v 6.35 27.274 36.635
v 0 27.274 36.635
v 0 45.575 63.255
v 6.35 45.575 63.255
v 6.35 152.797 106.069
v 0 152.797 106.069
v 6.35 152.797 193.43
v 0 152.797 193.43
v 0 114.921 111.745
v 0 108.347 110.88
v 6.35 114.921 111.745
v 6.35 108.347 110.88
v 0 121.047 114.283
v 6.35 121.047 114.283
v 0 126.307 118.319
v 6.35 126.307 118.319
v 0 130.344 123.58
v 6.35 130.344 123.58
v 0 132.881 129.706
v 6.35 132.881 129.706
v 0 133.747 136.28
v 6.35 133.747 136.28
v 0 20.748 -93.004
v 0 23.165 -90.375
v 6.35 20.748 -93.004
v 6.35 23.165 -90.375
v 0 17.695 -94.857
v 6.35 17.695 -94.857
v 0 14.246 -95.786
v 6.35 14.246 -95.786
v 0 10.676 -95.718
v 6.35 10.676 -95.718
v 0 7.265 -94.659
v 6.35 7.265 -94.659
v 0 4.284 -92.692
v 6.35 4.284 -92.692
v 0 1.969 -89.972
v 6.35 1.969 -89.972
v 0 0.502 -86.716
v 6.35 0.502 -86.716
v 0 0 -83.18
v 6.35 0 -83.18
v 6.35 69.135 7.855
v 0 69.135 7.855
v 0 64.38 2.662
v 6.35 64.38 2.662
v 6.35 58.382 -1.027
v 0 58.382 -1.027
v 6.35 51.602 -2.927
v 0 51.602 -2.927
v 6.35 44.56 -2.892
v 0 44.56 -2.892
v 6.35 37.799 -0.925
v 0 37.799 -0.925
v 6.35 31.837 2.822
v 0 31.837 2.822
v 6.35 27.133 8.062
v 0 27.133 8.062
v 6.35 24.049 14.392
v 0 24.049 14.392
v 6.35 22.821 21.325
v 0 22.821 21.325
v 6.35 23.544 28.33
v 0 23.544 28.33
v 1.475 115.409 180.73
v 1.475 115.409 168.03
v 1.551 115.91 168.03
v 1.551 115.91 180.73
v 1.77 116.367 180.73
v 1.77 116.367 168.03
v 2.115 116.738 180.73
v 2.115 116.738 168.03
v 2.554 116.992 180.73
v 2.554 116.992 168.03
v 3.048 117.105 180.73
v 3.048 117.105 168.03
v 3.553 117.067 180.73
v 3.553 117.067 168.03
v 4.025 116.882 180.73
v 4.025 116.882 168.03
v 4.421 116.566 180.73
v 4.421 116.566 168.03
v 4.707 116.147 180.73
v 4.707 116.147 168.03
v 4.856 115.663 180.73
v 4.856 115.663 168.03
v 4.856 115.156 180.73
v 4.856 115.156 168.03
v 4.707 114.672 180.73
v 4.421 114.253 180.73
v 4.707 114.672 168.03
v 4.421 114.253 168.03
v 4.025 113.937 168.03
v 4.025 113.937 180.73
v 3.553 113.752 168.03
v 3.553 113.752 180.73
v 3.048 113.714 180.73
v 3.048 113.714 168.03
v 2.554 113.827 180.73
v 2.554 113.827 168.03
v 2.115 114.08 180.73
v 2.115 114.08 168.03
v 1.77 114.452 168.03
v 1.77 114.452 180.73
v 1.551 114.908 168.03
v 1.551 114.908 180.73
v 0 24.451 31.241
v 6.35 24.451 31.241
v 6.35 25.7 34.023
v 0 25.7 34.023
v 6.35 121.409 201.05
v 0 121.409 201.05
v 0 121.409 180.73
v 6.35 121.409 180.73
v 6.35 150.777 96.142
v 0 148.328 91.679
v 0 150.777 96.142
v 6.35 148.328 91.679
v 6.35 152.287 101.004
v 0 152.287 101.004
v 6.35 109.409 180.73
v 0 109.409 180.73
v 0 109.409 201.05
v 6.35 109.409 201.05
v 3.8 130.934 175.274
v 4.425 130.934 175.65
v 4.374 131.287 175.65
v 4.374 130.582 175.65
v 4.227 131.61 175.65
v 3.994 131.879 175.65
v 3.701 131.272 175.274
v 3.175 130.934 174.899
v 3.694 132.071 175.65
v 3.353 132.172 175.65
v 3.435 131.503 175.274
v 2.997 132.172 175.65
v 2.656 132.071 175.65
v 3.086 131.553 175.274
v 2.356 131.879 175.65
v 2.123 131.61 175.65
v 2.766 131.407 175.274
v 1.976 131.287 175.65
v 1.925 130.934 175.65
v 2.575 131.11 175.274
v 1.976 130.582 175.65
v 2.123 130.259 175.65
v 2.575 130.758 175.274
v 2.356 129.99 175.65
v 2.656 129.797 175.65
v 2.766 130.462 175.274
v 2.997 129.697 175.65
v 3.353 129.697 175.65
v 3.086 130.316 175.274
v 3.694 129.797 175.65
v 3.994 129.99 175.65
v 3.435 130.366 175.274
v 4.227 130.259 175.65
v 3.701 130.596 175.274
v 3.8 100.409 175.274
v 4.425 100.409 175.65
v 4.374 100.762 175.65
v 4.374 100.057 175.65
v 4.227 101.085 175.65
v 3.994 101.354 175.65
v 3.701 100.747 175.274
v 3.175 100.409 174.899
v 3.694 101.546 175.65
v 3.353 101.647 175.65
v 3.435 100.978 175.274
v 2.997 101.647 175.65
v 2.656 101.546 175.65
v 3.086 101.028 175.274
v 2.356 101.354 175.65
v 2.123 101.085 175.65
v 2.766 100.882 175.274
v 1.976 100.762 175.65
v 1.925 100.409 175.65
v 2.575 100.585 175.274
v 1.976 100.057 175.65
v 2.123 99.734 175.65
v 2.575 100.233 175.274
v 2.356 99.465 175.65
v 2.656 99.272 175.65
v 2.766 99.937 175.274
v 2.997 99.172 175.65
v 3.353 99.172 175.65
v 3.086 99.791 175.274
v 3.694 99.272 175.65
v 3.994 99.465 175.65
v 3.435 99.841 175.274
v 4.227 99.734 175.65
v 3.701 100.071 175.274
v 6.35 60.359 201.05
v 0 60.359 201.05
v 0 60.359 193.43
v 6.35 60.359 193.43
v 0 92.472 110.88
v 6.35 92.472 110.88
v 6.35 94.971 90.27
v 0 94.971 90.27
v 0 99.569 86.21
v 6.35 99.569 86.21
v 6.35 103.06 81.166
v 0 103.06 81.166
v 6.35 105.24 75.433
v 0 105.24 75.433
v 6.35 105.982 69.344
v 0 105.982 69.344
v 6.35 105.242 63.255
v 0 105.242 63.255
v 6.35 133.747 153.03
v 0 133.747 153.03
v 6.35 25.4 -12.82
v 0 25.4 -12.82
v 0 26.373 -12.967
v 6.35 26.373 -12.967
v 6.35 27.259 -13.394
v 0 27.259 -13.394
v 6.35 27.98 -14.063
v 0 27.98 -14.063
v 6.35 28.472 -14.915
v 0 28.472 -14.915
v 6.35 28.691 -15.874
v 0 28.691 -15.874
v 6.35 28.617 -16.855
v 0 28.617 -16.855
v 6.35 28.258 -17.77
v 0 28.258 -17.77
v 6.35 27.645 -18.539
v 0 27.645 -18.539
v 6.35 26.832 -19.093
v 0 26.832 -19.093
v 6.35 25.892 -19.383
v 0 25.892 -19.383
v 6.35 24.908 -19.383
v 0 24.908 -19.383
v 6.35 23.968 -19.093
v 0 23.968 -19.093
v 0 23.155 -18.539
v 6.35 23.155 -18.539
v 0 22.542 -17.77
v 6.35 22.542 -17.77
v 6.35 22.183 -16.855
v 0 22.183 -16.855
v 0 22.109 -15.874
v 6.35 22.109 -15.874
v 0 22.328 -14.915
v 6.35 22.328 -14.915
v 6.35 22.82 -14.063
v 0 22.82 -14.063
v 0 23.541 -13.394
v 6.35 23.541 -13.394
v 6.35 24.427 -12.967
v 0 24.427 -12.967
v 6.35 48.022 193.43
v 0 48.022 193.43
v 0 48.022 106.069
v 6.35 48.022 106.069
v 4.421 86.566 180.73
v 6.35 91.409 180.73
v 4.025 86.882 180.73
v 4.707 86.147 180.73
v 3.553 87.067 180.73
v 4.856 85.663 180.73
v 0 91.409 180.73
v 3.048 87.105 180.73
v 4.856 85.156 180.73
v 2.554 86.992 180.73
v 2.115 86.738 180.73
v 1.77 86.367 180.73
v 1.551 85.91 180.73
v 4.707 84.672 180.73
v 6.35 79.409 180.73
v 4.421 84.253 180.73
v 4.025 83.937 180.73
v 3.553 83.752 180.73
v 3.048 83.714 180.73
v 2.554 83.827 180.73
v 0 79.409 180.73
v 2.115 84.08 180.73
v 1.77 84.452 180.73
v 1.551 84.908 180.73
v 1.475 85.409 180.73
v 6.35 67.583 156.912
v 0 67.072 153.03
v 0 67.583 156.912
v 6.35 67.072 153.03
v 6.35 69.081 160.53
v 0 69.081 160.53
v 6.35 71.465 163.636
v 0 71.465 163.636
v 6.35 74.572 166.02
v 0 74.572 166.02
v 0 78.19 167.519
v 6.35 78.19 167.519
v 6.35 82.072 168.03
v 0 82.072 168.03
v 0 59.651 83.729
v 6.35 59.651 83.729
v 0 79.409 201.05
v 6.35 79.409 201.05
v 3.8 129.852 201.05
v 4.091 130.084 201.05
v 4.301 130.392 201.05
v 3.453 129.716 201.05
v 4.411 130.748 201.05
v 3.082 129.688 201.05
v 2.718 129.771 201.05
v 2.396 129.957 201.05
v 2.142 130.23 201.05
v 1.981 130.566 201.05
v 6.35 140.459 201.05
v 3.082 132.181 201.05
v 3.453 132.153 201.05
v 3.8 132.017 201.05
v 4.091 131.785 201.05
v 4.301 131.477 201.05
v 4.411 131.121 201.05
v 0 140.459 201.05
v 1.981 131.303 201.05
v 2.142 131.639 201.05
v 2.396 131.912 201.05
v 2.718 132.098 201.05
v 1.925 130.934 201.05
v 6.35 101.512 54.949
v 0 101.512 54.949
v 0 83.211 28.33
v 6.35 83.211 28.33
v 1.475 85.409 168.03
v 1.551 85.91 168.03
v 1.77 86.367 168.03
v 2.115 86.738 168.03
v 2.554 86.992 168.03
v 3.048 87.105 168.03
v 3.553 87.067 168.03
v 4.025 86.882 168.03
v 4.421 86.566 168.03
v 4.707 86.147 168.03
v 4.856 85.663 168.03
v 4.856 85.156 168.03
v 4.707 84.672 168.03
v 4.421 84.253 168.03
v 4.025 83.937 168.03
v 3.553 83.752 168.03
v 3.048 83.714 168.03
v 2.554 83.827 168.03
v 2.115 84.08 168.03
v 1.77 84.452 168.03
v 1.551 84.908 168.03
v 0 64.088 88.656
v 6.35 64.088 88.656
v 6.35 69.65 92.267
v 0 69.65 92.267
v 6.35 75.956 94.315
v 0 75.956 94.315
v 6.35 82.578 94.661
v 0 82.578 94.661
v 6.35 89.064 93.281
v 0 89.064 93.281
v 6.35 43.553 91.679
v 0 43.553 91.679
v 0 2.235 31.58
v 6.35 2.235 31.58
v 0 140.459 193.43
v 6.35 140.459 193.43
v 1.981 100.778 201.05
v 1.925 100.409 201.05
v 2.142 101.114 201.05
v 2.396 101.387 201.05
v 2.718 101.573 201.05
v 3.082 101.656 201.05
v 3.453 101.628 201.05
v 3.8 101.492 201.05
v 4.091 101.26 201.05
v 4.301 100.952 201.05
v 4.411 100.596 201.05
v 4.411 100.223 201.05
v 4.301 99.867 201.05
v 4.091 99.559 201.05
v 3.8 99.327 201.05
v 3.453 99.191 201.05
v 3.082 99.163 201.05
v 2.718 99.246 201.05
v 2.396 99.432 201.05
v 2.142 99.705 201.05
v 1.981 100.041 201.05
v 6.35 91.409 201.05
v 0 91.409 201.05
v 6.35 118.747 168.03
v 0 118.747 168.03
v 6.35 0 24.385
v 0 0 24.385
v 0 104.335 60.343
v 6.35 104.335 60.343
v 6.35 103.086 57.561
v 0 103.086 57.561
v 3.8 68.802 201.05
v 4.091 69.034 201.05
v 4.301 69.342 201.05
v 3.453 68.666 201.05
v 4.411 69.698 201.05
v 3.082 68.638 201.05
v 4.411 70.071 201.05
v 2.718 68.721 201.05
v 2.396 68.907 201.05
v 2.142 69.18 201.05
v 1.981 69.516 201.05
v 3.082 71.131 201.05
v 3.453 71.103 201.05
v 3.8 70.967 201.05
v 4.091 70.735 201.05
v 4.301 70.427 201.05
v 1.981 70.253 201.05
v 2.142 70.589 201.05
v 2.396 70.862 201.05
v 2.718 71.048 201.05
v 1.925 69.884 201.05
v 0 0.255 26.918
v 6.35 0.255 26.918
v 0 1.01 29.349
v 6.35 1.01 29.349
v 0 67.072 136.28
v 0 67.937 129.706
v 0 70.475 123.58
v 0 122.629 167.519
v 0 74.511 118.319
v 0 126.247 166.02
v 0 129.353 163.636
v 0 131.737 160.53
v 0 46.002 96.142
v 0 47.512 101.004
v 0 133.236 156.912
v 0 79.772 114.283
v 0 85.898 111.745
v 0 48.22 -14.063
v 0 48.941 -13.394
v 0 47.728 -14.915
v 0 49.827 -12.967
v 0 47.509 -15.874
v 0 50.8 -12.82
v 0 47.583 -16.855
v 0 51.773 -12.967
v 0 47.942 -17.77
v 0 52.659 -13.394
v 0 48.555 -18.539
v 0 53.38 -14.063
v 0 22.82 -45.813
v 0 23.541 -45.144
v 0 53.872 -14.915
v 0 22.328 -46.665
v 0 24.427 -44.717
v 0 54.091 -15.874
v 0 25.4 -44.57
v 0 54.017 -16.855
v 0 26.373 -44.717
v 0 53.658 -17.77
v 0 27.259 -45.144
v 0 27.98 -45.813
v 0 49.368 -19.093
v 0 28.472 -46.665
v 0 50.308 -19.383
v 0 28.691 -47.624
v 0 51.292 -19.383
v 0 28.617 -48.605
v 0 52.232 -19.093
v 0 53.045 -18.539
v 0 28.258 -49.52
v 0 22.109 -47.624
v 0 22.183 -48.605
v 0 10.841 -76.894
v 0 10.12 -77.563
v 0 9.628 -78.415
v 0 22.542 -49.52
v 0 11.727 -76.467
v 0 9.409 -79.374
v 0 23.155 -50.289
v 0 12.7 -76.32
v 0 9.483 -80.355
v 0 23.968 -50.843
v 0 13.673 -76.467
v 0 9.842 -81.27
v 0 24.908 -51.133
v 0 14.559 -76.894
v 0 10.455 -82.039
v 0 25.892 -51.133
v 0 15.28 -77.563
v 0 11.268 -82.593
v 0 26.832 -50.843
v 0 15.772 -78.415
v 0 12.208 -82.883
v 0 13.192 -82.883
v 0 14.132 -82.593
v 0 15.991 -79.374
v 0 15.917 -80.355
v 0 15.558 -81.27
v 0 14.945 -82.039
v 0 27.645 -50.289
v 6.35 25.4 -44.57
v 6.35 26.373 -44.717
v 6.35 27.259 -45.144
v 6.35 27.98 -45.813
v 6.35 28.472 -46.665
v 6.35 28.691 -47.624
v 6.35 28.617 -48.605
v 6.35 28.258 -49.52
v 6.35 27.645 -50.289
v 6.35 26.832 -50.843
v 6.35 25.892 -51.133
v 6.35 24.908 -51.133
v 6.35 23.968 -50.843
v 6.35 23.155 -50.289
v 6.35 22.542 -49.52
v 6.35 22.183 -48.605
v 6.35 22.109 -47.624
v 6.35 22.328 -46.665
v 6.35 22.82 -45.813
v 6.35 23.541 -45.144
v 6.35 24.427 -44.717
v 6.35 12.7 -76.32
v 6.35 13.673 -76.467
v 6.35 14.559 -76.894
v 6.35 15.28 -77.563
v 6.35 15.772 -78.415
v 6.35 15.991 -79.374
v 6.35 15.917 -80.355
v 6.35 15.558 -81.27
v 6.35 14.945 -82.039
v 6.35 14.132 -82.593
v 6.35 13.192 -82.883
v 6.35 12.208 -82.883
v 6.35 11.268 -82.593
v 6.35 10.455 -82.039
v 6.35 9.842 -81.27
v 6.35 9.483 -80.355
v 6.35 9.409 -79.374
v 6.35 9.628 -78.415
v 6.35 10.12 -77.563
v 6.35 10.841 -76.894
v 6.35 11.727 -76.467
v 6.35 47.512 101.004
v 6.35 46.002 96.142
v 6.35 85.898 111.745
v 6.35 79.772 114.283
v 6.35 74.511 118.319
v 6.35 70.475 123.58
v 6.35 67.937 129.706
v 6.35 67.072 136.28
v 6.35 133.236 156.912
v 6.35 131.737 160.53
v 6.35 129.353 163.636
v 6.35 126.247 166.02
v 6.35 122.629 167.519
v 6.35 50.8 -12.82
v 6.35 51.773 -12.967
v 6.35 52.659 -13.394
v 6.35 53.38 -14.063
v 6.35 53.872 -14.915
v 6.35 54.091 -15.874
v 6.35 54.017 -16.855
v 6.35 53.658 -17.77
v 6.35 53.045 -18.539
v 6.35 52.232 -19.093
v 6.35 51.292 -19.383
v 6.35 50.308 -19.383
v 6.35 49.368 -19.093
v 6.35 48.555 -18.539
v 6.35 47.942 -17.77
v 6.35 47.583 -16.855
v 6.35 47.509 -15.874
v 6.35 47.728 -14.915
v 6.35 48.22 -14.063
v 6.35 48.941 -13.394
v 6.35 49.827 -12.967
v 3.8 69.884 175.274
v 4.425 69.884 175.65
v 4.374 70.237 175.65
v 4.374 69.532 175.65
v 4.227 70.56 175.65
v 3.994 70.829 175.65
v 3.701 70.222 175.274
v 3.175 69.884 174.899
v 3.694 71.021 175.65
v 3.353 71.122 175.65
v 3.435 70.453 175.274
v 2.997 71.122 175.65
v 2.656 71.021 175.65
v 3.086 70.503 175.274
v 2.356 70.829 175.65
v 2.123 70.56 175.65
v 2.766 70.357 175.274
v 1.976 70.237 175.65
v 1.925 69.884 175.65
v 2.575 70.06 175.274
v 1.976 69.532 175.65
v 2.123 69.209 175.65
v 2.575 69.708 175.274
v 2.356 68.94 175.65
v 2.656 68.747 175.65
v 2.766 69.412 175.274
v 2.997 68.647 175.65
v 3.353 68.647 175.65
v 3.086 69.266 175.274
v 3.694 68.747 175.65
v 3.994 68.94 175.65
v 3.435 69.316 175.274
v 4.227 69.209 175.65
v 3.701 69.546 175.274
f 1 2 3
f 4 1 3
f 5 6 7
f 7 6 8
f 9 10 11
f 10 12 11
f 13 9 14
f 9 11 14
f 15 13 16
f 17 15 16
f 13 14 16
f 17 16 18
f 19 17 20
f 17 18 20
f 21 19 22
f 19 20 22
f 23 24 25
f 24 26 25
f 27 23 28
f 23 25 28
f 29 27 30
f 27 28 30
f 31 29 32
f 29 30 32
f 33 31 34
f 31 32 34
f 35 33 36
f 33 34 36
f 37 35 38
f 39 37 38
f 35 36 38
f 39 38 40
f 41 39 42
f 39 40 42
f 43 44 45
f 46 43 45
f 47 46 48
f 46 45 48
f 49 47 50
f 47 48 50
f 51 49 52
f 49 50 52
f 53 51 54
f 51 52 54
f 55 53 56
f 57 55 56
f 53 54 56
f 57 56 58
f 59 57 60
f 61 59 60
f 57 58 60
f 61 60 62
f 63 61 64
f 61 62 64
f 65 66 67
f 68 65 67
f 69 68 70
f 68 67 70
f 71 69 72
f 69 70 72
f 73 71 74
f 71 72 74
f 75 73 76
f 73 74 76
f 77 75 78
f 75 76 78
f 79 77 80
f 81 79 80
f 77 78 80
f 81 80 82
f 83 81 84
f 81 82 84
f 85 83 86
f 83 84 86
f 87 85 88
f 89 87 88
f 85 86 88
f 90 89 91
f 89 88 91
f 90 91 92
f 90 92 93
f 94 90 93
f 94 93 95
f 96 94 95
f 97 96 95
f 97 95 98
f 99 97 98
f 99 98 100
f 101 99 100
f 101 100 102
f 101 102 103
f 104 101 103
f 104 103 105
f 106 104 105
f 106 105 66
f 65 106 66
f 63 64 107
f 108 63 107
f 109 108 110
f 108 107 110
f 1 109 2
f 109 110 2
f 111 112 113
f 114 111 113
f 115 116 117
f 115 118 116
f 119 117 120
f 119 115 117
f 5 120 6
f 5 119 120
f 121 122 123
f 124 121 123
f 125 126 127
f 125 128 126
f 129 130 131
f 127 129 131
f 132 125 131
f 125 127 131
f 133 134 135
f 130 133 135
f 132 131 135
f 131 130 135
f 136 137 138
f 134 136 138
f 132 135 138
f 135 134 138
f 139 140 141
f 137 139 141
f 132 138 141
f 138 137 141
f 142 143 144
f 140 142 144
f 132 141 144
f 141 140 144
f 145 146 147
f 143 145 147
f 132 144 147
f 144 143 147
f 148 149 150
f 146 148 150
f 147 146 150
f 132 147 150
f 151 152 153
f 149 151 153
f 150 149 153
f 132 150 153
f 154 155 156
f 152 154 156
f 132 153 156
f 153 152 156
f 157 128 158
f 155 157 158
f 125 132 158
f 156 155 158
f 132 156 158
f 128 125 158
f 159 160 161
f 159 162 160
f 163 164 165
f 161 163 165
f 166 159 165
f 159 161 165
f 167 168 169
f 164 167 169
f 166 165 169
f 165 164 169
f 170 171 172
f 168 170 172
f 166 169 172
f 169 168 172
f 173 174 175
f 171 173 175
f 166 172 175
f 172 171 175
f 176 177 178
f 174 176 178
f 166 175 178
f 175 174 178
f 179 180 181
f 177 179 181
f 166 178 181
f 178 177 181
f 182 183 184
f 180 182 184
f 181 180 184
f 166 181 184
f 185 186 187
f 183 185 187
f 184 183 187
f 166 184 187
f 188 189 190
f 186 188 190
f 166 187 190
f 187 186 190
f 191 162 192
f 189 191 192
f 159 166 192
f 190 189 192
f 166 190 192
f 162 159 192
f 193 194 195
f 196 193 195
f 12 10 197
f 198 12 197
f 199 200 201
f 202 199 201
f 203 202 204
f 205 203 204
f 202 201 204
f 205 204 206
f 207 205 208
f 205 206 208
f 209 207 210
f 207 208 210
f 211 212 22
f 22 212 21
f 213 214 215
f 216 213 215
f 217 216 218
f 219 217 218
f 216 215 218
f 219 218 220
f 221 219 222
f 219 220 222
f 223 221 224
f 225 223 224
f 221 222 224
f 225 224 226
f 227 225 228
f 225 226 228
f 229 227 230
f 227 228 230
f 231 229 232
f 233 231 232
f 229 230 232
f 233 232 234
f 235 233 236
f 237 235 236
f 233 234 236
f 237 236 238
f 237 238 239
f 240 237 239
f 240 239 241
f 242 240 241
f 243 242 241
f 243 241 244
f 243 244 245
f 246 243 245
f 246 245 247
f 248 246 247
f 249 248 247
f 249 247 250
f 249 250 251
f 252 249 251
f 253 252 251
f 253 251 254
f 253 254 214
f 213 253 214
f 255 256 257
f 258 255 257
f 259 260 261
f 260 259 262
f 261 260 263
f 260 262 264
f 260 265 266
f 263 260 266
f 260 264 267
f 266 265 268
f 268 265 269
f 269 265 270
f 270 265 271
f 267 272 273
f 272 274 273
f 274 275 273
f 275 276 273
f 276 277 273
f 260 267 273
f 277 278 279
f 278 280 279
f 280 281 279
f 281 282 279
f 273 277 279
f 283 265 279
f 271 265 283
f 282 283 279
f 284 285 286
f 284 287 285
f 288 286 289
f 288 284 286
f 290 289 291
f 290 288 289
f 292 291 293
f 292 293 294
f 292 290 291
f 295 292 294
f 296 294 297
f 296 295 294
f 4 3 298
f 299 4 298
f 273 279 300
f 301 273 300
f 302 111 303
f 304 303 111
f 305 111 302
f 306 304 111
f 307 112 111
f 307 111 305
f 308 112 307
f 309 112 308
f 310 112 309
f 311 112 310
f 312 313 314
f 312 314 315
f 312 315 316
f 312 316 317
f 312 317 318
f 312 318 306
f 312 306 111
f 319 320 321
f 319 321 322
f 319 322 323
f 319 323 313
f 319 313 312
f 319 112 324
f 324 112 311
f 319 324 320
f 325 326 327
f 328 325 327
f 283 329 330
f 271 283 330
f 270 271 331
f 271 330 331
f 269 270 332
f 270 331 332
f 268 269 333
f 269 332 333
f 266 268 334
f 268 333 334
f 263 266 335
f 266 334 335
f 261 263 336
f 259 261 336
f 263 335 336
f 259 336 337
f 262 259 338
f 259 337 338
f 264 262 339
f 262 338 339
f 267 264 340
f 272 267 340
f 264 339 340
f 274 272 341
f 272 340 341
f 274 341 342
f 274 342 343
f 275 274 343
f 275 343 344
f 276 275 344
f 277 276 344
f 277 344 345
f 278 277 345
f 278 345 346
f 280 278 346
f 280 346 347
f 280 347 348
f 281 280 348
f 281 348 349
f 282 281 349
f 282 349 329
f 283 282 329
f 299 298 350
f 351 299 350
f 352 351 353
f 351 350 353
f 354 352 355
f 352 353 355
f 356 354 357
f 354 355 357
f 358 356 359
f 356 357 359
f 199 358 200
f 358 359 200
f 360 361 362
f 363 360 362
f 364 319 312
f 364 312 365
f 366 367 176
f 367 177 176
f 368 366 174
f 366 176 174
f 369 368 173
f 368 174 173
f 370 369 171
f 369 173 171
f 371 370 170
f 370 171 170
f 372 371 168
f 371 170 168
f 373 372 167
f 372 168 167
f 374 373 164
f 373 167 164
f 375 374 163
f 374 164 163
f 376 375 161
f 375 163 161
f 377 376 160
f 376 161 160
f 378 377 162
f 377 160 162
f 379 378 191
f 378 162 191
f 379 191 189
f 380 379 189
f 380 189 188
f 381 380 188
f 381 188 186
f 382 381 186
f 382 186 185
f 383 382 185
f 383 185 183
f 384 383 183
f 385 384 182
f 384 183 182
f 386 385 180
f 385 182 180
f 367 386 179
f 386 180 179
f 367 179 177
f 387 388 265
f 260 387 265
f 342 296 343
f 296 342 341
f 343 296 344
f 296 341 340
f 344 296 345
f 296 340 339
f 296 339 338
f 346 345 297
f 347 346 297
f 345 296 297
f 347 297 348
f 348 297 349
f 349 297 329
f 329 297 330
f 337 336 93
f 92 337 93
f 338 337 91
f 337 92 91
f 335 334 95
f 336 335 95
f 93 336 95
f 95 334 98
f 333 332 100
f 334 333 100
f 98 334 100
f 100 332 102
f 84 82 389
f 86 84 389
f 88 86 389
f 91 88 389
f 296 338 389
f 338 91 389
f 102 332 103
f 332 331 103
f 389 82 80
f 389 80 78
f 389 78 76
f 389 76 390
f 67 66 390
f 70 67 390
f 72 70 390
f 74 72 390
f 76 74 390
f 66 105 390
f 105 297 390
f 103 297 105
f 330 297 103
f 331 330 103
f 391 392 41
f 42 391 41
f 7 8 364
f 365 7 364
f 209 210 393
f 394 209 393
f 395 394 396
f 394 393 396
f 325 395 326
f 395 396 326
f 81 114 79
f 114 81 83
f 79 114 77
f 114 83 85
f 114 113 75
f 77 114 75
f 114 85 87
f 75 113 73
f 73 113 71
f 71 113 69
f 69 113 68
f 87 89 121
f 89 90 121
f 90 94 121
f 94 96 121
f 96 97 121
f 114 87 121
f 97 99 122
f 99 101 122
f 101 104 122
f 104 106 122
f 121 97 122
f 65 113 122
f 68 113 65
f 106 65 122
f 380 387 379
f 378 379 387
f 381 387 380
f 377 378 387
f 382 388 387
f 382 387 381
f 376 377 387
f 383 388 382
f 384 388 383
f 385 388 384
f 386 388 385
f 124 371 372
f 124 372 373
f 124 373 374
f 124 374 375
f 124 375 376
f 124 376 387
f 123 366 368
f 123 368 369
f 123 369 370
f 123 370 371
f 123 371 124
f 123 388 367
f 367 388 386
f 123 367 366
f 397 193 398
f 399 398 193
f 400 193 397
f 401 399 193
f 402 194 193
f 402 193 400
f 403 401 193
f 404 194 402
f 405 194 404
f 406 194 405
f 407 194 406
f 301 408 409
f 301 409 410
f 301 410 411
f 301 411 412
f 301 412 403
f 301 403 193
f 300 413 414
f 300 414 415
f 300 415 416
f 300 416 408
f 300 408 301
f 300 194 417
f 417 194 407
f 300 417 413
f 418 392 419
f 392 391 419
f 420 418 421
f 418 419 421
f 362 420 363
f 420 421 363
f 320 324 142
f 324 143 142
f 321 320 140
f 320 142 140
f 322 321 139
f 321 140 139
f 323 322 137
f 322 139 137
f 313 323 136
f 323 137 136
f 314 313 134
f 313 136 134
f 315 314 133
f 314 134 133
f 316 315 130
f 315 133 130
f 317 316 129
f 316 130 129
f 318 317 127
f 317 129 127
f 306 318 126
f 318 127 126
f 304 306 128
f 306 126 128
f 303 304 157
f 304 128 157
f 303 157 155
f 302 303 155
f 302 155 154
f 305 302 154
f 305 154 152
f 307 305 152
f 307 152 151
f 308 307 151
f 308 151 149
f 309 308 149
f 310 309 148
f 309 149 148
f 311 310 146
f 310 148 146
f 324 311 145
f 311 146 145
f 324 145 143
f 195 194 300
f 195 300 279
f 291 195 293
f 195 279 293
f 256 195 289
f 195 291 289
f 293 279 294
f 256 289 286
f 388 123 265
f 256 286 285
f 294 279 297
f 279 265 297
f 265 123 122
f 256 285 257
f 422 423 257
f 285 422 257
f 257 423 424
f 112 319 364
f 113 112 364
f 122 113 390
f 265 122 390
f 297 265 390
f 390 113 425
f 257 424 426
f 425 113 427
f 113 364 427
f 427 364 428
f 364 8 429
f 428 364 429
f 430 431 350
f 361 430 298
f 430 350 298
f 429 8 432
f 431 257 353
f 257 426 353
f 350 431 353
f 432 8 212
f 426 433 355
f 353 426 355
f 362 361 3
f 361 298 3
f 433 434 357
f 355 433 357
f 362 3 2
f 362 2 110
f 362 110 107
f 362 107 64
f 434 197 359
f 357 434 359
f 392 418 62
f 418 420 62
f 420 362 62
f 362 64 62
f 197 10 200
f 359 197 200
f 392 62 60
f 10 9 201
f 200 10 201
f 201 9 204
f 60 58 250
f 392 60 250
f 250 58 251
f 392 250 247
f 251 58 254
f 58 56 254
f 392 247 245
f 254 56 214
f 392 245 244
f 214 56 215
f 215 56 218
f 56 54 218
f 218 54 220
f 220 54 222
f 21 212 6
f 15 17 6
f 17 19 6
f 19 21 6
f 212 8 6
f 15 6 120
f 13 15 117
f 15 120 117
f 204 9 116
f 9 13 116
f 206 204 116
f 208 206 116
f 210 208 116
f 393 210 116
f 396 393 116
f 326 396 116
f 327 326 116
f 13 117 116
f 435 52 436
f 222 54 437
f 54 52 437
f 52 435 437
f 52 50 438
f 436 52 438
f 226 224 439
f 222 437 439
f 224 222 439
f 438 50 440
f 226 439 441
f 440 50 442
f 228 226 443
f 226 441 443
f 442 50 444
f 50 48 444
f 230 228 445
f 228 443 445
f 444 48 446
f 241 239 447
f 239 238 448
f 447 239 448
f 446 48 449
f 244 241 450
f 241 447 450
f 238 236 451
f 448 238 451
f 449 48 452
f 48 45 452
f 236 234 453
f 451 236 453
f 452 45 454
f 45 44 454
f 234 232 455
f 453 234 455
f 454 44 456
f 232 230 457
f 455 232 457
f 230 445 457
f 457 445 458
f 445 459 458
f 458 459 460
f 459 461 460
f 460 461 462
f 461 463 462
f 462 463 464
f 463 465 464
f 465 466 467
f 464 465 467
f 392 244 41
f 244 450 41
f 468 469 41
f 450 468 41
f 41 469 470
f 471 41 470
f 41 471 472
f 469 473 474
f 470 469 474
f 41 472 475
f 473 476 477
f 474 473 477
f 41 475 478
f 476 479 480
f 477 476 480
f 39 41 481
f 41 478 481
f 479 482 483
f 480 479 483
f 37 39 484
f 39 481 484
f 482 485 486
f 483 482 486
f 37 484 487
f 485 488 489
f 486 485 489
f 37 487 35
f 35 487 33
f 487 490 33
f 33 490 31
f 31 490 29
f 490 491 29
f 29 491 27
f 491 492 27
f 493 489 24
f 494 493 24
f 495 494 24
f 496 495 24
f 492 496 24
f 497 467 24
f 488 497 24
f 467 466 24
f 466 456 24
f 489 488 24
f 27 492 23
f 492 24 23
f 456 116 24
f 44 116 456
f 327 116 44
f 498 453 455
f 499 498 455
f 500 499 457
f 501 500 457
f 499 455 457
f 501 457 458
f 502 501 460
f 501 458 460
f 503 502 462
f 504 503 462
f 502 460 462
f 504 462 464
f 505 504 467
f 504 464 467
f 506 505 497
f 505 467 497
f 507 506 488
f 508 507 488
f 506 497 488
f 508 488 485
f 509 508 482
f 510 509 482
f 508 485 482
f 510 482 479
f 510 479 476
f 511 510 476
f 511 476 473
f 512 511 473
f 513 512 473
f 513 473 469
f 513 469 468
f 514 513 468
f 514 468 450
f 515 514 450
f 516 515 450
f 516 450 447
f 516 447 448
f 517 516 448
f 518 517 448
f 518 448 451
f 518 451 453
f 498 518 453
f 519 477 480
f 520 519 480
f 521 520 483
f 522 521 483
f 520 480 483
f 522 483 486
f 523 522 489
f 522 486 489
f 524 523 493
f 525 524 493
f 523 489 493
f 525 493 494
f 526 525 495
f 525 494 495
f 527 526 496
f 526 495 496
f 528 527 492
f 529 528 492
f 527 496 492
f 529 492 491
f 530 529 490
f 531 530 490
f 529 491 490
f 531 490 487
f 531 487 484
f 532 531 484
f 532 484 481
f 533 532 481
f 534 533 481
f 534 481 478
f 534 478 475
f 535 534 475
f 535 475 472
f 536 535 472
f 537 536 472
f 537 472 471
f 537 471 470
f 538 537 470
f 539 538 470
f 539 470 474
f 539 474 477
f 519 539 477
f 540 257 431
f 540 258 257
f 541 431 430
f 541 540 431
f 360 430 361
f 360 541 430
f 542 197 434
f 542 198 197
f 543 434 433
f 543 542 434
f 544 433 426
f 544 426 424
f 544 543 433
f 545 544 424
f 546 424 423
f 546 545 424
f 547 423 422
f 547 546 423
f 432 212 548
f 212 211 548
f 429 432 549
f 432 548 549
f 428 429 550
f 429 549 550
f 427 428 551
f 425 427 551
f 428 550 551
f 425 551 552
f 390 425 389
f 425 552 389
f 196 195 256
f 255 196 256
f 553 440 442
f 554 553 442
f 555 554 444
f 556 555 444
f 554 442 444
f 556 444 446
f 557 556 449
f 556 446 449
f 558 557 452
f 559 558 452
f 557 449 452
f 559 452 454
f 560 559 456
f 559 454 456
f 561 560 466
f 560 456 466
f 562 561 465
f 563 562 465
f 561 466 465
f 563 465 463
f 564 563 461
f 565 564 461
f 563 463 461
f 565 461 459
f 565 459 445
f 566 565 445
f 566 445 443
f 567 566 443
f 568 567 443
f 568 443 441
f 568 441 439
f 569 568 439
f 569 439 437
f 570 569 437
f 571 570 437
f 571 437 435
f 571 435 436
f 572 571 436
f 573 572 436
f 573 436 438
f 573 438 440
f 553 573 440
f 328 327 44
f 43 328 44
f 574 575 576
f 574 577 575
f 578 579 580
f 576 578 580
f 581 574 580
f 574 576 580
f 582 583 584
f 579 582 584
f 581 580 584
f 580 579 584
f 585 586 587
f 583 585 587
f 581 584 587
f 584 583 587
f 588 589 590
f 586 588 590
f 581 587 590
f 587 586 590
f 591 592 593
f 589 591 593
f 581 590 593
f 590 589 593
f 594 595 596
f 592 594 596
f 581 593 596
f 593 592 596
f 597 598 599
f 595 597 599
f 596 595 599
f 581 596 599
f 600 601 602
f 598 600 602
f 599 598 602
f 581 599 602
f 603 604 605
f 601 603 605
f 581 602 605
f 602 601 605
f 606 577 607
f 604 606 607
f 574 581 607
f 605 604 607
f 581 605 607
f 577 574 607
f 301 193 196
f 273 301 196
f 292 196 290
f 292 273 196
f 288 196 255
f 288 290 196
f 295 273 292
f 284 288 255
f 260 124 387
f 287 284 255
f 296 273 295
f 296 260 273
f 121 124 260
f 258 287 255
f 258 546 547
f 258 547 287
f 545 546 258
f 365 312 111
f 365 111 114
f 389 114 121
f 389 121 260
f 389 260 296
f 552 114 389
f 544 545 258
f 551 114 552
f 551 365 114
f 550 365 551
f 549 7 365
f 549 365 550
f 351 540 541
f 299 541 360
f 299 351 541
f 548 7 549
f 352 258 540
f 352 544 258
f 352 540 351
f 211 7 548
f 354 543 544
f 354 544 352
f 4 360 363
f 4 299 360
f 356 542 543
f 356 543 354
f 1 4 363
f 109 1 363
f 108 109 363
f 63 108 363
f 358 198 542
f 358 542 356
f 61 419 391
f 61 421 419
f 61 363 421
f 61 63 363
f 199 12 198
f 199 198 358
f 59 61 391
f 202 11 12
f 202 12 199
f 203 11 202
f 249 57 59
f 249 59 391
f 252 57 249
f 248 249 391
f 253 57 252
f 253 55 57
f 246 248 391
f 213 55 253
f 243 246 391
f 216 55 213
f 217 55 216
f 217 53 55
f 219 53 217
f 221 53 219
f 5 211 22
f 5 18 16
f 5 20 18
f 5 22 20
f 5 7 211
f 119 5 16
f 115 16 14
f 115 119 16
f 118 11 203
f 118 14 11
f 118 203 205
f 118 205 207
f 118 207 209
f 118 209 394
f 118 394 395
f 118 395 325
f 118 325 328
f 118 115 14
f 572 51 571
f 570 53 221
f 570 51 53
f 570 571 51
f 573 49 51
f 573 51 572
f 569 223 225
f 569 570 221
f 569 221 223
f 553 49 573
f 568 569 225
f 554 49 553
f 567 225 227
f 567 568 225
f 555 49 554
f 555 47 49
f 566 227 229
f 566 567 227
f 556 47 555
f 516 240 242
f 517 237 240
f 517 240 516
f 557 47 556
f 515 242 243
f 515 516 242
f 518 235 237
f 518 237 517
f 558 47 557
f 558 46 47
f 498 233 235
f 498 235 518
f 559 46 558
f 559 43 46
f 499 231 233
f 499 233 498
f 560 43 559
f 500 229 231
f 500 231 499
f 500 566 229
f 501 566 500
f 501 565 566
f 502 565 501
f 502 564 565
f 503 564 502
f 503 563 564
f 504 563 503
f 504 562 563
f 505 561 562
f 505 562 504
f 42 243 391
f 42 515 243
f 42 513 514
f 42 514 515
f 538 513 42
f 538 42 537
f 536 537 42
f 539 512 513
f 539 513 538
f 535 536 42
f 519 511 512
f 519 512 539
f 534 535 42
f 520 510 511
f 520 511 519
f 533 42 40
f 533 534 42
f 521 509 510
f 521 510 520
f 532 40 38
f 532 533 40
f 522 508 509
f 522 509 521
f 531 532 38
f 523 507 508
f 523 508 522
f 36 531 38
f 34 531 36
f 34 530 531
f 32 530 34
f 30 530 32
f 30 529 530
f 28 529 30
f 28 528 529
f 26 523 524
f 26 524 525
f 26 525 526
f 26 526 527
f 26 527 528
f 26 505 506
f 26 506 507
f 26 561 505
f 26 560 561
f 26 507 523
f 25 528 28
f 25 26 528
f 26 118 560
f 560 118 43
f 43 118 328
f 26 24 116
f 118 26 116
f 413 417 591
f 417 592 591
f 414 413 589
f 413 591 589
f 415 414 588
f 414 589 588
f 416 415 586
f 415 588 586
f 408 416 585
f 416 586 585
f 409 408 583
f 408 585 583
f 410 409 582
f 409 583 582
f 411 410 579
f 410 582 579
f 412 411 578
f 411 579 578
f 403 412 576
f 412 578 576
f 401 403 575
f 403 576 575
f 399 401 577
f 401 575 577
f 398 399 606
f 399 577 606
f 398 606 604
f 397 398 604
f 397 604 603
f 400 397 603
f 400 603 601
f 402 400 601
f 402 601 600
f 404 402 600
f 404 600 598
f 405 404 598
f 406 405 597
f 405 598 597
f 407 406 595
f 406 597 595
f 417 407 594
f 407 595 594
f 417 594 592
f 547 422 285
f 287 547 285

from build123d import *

# Parameters (mm, degrees)
SKETCH1_W                 = 7.62
SKETCH1_H                 = 19.05
SKETCH1_H_2               = 18
BOSS_EXTRUDE1_DEPTH       = 6.35
FILLET1_R                 = 25.4
FILLET2_R                 = 12.7
M6_CLEARANCE_HOLE1_D      = 6.6
M3_CLEARANCE_HOLE1_D      = 3.4
M3_CLEARANCE_HOLE1_DEPTH  = 12.7
FILLET4_R                 = 15
M3X0_5_TAPPED_HOLE1_D     = 2.5
M3X0_5_TAPPED_HOLE1_DEPTH = 25.4
M3X0_5_TAPPED_HOLE1_TIP   = 0.751075774


with BuildPart() as part:
    # Sketch1 → Boss-Extrude1 (new body)
    with BuildSketch(Plane(origin=(0, 0, 0), x_dir=(0, 0, -1), z_dir=(1, 0, 0))):
        with BuildLine():
            Line((-28.329731999, 0), (124.070268001, 0))
            Line((124.070268001, 0), (-28.329731999, 104.775))
            Line((-28.329731999, 104.775), (-28.329731999, 83.211174444))
            Line((-28.329731999, 83.211174444), (-7.855401914, 69.135072511))
            ThreePointArc((-7.855401914, 69.135072511), (0.925492913, 37.798764283), (-28.329731999, 23.543935534))
            Line((-28.329731999, 23.543935534), (-28.329731999, 0))
        make_face()
        with BuildLine():
            Line((-28.329731999, 83.211174444), (-28.329731999, 104.775))
            Line((-28.329731999, 104.775), (-63.254731999, 128.7859375))
            Line((-63.254731999, 128.7859375), (-63.254731999, 105.242001966))
            ThreePointArc((-63.254731999, 105.242001966), (-58.93358663, 103.752256793), (-54.949397882, 101.512194739))
            Line((-54.949397882, 101.512194739), (-28.329731999, 83.211174444))
        make_face()
        with BuildLine():
            Line((-63.254731999, 105.242001966), (-63.254731999, 128.7859375))
            Line((-63.254731999, 128.7859375), (-98.179731999, 152.796875))
            Line((-98.179731999, 152.796875), (-98.179731999, 100.409375))
            Line((-98.179731999, 100.409375), (-90.269894858, 94.971361965))
            ThreePointArc((-90.269894858, 94.971361965), (-78.365507142, 104.323608978), (-63.254731999, 105.242001966))
        make_face()
        with BuildLine():
            Line((-98.179731999, 48.021875), (-63.254731999, 24.0109375))
            Line((-63.254731999, 24.0109375), (-63.254731999, 45.574763056))
            Line((-63.254731999, 45.574763056), (-83.729062085, 59.650864989))
            ThreePointArc((-83.729062085, 59.650864989), (-94.31459291, 75.956462655), (-90.269894858, 94.971361965))
            Line((-90.269894858, 94.971361965), (-98.179731999, 100.409375))
            Line((-98.179731999, 100.409375), (-98.179731999, 48.021875))
        make_face()
        with BuildLine():
            Line((-63.254731999, 24.0109375), (-28.329731999, 0))
            Line((-28.329731999, 0), (-28.329731999, 23.543935534))
            ThreePointArc((-28.329731999, 23.543935534), (-32.650877369, 25.033680707), (-36.635066117, 27.273742761))
            Line((-36.635066117, 27.273742761), (-63.254731999, 45.574763056))
            Line((-63.254731999, 45.574763056), (-63.254731999, 24.0109375))
        make_face()
        Polygon((-139.454731999, 48.021875), (-98.179731999, 48.021875), (-98.179731999, 100.409375), (-98.179731999, 152.796875), (-139.454731999, 152.796875), (-139.454731999, 133.746875), (-110.879731999, 133.746875), (-110.879731999, 67.071875), (-139.454731999, 67.071875), align=None)
        Polygon((-180.729731999, 48.021875), (-139.454731999, 48.021875), (-139.454731999, 67.071875), (-168.029731999, 67.071875), (-168.029731999, 133.746875), (-139.454731999, 133.746875), (-139.454731999, 152.796875), (-180.729731999, 152.796875), (-180.729731999, 121.409375), (-180.729731999, 109.409375), (-180.729731999, 100.409375), (-180.729731999, 91.409375), (-180.729731999, 79.409375), align=None)
        Polygon((-180.729731999, 121.409375), (-180.729731999, 152.796875), (-193.429731999, 152.796875), (-193.429731999, 140.459375), (-193.429731999, 121.409375), align=None)
        with Locations((-197.239731999, 130.934375)):
            Rectangle(SKETCH1_W, SKETCH1_H)
        Polygon((-193.429731999, 91.409375), (-180.729731999, 91.409375), (-180.729731999, 100.409375), (-180.729731999, 109.409375), (-193.429731999, 109.409375), align=None)
        with Locations((-197.239731999, 100.409375)):
            Rectangle(SKETCH1_W, SKETCH1_H_2)
        with Locations((-197.239731999, 69.884375)):
            Rectangle(SKETCH1_W, SKETCH1_H)
        Polygon((-193.429731999, 48.021875), (-180.729731999, 48.021875), (-180.729731999, 79.409375), (-193.429731999, 79.409375), (-193.429731999, 60.359375), align=None)
    extrude(amount=BOSS_EXTRUDE1_DEPTH)

    # Fillet1
    fillet1_edges = [part.edges().sort_by_distance(p)[0] for p in [
        (3.175, 67.071875, 110.879731999),
        (3.175, 133.746875, 110.879731999),
        (3.175, 152.796875, 98.179731999),
        (3.175, 48.021875, 98.179731999),
    ]]
    fillet(fillet1_edges, radius=FILLET1_R)

    # Fillet2
    fillet2_edges = [part.edges().sort_by_distance(p)[0] for p in [
        (3.175, 0, -124.070268001),
        (3.175, 0, 28.329731999),
    ]]
    fillet(fillet2_edges, radius=FILLET2_R)

    # M6 Clearance Hole1 (through all)
    with Locations(Plane(origin=(6.35, 0, 0), x_dir=(0, 0, -1), z_dir=(1, 0, 0))):
        with Locations((16.120268001, 25.4), (47.870268001, 25.4), (79.620268001, 12.7), (16.120268001, 50.8)):
            Hole(M6_CLEARANCE_HOLE1_D / 2)

    # M3 Clearance Hole1
    with Locations(Plane.XY.offset(180.729731999)):
        with Locations((3.175, 85.409375), (3.175, 115.409375)):
            Hole(M3_CLEARANCE_HOLE1_D / 2, depth=M3_CLEARANCE_HOLE1_DEPTH)

    # Fillet4
    fillet4_edges = [part.edges().sort_by_distance(p)[0] for p in [
        (3.175, 133.746875, 168.029731999),
        (3.175, 67.071875, 168.029731999),
    ]]
    fillet(fillet4_edges, radius=FILLET4_R)

    # M3x0.5 Tapped Hole1
    with Locations(Plane.XY.offset(201.049731999)):
        with Locations((3.175, 69.884375), (3.175, 130.934375), (3.175, 100.409375)):
            Hole(M3X0_5_TAPPED_HOLE1_D / 2, depth=M3X0_5_TAPPED_HOLE1_DEPTH)
            with Locations((0, 0, -(M3X0_5_TAPPED_HOLE1_DEPTH + M3X0_5_TAPPED_HOLE1_TIP / 2))):  # 118° drill point
                Cone(0, M3X0_5_TAPPED_HOLE1_D / 2, M3X0_5_TAPPED_HOLE1_TIP, mode=Mode.SUBTRACT)


solid = part.part
